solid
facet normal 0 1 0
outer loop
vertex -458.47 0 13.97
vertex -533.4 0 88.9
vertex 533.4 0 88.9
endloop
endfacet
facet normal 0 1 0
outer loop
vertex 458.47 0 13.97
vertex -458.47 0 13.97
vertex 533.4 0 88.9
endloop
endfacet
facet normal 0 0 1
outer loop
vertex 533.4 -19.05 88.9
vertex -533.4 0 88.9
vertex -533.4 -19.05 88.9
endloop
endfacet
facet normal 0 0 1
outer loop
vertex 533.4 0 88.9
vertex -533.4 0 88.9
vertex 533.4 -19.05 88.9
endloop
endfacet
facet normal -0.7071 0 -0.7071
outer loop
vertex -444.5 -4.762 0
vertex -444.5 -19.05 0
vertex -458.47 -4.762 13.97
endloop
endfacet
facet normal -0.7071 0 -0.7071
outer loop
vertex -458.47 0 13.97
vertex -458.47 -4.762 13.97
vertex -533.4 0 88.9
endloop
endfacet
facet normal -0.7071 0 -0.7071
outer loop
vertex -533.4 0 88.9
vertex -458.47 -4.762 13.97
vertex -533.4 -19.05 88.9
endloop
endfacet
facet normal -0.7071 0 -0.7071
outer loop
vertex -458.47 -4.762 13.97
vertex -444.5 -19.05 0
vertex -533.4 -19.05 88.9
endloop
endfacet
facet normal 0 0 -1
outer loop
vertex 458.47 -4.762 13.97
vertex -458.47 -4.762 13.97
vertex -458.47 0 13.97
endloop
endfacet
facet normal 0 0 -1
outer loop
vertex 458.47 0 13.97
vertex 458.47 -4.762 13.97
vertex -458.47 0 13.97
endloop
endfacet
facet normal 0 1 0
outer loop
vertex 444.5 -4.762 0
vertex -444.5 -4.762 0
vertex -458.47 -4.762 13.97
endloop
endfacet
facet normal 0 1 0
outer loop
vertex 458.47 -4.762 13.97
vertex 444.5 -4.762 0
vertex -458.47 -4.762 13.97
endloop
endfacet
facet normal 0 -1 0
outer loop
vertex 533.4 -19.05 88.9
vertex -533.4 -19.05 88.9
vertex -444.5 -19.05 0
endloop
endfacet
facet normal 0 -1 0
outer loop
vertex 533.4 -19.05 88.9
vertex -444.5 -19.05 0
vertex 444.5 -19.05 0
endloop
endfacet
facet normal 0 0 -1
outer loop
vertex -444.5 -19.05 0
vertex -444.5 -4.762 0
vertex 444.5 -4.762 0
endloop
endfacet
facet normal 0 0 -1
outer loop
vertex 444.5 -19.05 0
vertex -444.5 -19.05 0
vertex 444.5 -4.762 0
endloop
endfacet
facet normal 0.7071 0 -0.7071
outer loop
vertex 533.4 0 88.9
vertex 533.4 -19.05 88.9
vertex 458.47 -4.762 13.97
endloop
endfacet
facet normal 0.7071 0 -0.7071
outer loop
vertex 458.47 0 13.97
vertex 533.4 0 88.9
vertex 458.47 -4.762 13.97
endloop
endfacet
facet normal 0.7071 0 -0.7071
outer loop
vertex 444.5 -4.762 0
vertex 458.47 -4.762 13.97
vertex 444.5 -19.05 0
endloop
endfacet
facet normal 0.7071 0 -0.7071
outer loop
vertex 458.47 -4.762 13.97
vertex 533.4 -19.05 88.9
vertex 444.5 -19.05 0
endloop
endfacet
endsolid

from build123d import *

# Parameters (mm, degrees)
F0_W     = 1066.8
F0_H     = 88.9
F1_DEPTH = 19.05
F2_W     = 4.7625
F2_H     = 13.97
F3_DEPTH = 1066.801
F5_DEPTH = 19.051


with BuildPart() as f1:
    # F0 (on Front) → F1 (new body)
    with BuildSketch(Plane.XZ):
        with Locations((0, 44.45)):
            Rectangle(F0_W, F0_H)
    extrude(amount=F1_DEPTH)

    # F2 (on face) → F3 (cut, through all)
    with BuildSketch(Plane.YZ.offset(533.4)):
        with Locations((-2.38125, 6.985)):
            Rectangle(F2_W, F2_H)
    extrude(amount=-F3_DEPTH, mode=Mode.SUBTRACT)

    # F4 (on face) → F5 (cut, through all)
    with BuildSketch(Plane.XZ.offset(19.05)):
        Polygon((-444.5, 0), (-533.4, 88.9), (-533.4, 0), align=None)
        Polygon((444.5, 0), (533.4, 0), (533.4, 88.9), align=None)
    extrude(amount=-F5_DEPTH, mode=Mode.SUBTRACT)


solid = f1.part
